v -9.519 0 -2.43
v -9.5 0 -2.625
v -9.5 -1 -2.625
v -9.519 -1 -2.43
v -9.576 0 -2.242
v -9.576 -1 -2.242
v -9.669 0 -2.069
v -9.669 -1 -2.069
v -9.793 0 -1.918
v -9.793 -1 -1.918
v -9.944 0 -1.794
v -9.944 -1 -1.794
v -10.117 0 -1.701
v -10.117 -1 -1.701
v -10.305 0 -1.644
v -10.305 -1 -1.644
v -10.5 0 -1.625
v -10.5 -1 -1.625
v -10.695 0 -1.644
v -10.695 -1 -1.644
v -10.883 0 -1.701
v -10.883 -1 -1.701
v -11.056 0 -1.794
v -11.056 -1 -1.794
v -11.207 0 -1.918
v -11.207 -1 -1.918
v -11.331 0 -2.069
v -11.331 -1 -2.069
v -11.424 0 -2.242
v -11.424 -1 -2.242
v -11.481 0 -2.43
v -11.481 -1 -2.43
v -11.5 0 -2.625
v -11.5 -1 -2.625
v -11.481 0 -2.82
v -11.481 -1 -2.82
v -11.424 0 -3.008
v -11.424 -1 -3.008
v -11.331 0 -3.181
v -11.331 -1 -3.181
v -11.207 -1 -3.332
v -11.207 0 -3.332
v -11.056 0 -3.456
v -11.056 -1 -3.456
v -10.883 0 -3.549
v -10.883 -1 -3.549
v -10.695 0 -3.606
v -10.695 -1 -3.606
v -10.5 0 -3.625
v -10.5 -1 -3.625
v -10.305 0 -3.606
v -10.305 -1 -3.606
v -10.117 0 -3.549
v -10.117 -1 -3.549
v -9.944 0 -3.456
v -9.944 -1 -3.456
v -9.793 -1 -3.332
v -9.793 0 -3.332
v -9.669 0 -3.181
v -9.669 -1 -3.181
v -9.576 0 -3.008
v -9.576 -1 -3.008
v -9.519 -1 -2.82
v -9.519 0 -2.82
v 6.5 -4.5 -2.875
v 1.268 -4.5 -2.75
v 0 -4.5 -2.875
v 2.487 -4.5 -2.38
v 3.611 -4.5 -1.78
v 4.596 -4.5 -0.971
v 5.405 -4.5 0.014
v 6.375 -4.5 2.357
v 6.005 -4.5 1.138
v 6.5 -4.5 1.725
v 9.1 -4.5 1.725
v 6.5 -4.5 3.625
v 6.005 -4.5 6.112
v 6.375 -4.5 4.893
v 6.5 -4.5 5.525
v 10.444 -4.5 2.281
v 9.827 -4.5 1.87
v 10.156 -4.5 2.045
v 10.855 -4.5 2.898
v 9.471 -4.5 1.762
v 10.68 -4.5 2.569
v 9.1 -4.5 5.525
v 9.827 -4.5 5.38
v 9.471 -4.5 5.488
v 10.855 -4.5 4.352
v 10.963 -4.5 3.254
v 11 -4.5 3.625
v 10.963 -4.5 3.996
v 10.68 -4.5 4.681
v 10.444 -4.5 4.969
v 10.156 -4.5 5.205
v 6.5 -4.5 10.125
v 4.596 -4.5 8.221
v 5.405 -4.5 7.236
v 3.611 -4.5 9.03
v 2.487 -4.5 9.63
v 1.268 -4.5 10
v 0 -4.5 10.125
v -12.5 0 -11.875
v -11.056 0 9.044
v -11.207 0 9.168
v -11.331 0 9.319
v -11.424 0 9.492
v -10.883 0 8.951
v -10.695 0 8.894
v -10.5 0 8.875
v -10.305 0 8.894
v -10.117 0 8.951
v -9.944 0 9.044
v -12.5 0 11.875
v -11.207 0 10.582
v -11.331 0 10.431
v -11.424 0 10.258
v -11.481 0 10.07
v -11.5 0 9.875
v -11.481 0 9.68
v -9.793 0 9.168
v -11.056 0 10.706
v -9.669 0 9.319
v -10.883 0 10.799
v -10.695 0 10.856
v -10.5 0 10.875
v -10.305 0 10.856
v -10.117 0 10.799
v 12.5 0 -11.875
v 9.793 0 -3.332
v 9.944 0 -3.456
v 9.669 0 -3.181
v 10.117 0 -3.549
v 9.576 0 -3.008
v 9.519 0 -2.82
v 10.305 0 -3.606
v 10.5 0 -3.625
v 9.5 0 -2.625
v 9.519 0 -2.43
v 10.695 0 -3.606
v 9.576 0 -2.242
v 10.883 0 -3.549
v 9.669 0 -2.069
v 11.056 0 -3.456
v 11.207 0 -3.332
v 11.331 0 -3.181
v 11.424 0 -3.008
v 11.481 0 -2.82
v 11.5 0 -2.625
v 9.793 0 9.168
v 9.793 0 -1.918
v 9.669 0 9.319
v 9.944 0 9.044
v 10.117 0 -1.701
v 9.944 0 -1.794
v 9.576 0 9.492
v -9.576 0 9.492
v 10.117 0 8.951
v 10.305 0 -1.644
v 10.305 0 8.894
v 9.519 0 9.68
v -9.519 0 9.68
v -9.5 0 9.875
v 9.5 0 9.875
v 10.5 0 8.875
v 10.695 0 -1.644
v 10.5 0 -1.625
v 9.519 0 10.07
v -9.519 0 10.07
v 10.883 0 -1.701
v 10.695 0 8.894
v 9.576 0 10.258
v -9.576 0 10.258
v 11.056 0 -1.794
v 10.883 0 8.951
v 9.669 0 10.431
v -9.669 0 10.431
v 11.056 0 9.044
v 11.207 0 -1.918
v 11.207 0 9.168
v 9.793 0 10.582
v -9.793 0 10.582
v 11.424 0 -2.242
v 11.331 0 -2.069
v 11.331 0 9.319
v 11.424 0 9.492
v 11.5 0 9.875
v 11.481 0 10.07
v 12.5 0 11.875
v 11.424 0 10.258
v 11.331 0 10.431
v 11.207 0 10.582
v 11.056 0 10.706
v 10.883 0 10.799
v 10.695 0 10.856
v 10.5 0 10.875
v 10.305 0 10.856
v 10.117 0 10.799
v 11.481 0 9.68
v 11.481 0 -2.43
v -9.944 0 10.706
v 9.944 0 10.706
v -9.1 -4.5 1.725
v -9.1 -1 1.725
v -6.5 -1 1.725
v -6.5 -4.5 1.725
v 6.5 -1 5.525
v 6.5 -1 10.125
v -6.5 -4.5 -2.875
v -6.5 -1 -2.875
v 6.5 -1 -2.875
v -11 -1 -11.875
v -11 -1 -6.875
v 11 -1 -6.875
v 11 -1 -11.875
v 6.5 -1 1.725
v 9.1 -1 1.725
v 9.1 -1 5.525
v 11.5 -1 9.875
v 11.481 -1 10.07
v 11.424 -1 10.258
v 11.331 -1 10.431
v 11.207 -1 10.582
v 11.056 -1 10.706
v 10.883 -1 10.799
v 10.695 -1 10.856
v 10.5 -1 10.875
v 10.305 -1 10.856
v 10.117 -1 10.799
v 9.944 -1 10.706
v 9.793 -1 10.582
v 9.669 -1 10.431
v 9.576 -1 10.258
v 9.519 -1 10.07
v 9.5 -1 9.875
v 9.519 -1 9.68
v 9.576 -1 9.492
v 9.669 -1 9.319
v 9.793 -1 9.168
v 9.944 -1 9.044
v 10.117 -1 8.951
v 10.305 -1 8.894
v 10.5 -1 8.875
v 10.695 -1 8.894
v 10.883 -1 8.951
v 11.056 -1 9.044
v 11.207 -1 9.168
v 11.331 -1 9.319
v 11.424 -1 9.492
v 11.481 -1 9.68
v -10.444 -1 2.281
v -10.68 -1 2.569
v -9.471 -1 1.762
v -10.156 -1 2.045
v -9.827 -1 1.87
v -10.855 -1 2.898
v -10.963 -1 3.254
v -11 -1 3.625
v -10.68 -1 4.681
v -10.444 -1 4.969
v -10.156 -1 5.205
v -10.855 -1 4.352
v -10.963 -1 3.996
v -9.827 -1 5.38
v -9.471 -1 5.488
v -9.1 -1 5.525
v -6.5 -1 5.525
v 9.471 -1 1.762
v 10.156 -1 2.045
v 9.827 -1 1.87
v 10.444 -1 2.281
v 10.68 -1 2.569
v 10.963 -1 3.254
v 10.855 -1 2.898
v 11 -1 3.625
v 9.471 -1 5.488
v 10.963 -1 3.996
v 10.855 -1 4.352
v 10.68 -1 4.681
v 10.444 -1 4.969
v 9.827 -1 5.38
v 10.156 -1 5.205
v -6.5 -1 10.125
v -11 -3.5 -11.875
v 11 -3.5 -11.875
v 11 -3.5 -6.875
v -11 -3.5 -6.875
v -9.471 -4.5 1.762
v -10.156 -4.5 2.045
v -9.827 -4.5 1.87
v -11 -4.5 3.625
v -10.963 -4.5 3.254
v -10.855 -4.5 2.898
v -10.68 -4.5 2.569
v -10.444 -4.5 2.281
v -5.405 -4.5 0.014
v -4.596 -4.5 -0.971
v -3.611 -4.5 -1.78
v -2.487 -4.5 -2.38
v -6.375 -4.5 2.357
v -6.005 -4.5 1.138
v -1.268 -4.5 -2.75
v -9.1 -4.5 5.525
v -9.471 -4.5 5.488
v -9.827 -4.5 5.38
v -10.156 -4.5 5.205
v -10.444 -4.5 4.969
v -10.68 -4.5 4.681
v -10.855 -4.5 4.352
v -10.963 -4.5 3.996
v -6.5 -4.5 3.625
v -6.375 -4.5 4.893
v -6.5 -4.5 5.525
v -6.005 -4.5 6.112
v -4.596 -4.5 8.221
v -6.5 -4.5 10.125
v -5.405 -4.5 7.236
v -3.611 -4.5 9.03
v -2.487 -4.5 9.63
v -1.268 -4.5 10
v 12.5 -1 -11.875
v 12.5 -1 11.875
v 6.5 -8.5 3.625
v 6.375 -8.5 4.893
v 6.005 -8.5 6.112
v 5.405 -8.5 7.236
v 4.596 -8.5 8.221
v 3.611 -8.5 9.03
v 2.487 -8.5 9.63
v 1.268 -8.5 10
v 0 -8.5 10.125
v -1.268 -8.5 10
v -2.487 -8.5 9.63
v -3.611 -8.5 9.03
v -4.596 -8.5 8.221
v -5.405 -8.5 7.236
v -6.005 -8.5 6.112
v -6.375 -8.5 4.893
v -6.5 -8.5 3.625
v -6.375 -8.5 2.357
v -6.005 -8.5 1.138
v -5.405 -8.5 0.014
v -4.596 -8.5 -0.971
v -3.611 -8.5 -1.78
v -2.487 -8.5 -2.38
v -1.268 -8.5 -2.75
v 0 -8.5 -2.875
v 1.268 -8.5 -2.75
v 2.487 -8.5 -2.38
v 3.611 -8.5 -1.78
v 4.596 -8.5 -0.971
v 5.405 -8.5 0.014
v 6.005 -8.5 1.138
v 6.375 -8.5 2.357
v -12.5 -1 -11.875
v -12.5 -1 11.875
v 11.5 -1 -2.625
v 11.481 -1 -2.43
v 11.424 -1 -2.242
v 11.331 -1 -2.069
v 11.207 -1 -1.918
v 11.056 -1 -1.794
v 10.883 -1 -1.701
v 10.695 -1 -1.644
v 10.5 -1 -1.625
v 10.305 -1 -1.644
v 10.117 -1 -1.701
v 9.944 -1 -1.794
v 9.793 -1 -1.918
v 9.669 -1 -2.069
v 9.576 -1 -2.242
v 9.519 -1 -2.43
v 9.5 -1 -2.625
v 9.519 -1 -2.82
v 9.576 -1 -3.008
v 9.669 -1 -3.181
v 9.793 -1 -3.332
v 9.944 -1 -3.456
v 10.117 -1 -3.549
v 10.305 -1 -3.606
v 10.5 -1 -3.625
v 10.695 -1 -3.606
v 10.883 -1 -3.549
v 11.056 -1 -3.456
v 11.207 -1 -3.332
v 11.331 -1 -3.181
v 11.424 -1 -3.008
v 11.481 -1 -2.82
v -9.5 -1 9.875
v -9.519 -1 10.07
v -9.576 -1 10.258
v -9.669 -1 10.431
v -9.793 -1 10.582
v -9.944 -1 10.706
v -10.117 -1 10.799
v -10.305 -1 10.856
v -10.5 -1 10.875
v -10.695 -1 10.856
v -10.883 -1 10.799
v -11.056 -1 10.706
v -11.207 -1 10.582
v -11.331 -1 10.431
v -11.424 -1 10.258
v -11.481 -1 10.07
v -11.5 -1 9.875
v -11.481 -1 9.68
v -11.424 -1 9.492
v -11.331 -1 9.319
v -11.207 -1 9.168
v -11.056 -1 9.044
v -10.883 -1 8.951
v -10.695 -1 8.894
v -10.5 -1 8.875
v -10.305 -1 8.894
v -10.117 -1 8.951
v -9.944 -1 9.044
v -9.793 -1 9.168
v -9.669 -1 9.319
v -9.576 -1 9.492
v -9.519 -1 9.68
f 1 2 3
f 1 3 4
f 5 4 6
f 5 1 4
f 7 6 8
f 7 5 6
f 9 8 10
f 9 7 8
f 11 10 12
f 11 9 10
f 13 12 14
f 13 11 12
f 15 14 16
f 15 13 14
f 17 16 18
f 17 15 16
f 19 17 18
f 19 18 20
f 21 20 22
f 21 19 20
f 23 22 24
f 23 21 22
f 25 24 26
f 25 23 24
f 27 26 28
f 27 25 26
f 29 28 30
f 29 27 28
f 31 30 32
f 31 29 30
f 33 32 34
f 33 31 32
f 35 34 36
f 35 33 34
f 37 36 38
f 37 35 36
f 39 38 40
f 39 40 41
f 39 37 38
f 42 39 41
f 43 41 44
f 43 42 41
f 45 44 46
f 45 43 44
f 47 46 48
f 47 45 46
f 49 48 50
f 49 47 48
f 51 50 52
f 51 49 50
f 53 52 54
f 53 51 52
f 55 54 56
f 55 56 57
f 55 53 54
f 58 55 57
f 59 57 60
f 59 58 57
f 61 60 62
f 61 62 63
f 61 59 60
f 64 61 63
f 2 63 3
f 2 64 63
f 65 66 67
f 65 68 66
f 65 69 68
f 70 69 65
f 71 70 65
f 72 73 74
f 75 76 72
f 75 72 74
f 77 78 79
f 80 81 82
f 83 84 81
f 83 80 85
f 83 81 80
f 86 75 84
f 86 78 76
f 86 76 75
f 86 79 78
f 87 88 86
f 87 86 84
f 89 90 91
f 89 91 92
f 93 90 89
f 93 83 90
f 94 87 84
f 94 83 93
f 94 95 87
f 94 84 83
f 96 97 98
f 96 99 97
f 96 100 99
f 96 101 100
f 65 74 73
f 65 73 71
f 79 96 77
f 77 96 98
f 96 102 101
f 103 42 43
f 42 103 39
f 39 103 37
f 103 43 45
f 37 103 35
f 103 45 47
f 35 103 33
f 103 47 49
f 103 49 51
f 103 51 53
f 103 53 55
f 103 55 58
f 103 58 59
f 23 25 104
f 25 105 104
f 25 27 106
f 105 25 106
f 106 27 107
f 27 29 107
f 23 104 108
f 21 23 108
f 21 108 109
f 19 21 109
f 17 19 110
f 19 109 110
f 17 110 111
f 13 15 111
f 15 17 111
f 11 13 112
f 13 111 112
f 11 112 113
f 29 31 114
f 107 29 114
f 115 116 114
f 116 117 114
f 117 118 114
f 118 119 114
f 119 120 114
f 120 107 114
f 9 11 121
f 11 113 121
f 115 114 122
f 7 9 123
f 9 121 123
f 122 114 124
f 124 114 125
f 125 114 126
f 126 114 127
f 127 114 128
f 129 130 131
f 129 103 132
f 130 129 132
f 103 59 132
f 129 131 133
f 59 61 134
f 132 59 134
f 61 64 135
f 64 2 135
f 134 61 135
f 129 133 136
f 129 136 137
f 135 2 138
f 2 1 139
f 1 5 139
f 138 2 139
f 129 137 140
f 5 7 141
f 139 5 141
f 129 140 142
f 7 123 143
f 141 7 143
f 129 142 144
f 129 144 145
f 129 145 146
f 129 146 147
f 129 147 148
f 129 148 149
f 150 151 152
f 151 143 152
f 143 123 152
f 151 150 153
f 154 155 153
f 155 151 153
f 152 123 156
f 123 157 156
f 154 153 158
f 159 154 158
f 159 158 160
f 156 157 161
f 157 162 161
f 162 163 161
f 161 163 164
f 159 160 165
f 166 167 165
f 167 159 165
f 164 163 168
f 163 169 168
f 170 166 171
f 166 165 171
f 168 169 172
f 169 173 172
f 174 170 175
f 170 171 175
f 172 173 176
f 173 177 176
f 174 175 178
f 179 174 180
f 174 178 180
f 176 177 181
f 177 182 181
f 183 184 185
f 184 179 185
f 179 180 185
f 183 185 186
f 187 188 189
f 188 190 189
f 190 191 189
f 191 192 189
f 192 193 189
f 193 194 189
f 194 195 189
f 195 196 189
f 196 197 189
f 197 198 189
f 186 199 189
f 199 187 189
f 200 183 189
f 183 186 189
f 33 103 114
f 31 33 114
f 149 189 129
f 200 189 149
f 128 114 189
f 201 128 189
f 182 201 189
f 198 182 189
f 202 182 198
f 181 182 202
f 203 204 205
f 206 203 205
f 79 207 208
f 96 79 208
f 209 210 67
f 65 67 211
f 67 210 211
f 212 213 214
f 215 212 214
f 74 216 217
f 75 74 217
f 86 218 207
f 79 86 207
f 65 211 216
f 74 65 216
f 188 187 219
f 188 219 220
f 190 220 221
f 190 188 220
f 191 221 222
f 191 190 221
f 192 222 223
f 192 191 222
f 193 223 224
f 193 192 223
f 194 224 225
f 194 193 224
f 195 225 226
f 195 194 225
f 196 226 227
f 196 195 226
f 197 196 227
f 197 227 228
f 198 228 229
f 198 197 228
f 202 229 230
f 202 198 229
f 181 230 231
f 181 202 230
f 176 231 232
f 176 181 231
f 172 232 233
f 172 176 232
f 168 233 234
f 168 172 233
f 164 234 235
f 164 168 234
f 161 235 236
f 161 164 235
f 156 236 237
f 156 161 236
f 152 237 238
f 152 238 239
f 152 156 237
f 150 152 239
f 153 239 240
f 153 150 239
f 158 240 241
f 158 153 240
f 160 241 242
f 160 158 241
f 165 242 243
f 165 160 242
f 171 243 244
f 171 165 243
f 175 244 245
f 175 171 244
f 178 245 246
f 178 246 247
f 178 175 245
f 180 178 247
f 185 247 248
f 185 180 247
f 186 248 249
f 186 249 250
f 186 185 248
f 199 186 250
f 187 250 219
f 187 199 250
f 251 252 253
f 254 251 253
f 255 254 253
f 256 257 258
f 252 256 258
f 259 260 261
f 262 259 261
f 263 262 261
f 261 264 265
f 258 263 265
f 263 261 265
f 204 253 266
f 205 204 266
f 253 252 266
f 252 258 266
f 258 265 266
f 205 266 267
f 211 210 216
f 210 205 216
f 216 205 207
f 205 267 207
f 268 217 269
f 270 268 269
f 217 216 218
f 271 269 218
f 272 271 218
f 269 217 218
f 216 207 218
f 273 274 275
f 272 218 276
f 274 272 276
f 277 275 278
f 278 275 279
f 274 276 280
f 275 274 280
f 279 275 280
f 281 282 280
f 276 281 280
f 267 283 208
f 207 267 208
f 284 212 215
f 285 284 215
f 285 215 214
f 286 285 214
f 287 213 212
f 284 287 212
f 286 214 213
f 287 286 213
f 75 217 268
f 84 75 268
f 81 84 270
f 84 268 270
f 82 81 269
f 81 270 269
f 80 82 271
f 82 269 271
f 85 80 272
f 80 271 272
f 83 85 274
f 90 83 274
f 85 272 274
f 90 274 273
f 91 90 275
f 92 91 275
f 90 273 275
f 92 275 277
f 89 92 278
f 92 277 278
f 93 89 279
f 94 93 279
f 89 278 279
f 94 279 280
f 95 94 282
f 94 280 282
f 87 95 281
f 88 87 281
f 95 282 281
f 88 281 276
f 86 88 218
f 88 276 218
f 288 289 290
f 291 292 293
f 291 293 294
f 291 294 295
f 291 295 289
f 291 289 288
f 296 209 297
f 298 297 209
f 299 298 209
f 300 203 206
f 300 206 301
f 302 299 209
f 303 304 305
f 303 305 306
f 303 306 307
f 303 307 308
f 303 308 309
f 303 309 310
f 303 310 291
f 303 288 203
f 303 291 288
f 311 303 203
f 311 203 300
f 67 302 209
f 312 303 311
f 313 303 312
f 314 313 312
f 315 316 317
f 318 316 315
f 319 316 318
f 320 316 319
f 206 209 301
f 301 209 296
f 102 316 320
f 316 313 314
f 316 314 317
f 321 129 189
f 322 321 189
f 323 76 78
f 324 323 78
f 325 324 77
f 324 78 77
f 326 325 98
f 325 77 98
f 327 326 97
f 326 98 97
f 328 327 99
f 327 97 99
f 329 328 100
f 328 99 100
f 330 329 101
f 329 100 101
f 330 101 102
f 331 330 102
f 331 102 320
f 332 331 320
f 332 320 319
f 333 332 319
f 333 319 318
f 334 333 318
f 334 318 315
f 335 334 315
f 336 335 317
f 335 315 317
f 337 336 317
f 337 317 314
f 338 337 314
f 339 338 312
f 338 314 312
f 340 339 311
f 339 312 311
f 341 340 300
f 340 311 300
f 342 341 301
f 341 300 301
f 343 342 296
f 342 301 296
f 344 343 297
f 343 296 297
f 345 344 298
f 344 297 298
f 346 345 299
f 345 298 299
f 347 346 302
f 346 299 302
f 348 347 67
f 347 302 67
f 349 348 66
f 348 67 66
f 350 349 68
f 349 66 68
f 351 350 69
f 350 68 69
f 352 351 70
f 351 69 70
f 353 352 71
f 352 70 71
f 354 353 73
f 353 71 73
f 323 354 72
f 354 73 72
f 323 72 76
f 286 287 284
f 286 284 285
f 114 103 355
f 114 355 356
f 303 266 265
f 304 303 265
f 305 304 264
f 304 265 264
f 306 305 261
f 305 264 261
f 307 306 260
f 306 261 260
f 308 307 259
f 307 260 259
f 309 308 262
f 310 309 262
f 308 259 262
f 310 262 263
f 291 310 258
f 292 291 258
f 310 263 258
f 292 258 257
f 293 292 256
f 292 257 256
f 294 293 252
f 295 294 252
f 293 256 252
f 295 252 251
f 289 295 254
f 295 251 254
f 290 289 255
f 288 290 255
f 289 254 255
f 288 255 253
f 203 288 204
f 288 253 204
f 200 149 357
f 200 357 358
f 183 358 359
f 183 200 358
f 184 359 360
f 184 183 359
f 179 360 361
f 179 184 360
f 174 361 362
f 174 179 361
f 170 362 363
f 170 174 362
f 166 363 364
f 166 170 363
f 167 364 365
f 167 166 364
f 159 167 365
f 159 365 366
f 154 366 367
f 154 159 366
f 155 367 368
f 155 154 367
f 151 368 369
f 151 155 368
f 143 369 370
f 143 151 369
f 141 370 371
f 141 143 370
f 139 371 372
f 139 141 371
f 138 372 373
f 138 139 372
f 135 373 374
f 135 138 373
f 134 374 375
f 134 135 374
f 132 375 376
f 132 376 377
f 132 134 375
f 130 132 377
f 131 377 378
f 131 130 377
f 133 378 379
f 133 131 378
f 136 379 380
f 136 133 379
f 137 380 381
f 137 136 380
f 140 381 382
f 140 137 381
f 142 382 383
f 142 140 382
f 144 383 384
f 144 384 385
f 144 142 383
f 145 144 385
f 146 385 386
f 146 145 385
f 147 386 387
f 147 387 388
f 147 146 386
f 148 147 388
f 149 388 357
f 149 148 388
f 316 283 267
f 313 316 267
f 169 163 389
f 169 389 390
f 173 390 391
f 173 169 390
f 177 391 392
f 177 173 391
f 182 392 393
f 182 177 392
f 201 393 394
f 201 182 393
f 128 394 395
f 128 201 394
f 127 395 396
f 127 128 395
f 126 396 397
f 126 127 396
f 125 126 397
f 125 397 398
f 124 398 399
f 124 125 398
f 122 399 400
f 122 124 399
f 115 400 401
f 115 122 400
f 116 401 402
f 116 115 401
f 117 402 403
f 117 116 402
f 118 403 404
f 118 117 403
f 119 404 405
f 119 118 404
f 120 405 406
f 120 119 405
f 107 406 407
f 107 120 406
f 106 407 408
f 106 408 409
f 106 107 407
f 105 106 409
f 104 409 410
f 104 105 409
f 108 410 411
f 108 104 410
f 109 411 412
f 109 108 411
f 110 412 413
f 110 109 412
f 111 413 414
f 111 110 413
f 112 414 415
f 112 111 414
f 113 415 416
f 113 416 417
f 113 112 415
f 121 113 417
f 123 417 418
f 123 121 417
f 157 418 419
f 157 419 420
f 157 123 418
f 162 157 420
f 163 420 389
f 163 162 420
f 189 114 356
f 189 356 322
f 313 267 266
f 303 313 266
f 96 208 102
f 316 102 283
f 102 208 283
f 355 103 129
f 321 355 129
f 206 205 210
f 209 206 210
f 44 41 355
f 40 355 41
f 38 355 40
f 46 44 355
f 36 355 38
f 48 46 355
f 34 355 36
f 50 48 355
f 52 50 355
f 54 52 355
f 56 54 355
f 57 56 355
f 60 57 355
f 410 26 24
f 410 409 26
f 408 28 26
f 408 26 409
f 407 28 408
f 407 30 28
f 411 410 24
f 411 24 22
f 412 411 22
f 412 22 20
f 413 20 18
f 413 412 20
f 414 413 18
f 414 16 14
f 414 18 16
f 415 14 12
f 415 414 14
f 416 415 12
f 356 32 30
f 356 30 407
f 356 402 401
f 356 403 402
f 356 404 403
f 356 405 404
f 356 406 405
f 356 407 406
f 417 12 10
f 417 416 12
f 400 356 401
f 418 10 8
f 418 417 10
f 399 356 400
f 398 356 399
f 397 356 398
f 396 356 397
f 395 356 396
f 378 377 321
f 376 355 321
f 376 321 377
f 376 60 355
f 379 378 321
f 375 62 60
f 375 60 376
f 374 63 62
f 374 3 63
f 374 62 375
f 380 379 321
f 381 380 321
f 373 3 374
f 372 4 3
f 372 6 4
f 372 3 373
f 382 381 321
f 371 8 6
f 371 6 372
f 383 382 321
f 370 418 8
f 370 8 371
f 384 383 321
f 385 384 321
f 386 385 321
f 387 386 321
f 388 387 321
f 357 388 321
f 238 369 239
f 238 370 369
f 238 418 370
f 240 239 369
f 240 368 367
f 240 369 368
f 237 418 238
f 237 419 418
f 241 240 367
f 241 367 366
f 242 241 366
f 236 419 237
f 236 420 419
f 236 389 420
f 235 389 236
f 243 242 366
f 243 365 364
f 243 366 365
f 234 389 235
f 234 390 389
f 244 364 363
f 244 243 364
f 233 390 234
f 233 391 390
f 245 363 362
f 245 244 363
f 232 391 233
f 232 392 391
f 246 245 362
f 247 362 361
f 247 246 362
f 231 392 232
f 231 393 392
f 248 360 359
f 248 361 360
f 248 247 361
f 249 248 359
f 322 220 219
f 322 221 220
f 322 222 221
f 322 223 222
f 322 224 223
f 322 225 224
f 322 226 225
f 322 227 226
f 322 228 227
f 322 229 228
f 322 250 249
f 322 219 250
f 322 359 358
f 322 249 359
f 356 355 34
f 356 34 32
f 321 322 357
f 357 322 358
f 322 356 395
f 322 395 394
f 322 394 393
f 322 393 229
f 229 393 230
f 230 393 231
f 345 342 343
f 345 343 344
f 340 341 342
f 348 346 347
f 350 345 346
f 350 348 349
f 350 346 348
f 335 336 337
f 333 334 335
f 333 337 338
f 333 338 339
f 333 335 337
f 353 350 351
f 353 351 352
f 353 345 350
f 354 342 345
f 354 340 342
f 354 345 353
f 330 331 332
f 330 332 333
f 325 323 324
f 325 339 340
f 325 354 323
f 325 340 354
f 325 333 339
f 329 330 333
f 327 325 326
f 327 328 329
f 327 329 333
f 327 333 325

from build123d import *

# Parameters (mm, degrees)
F0_W     = 25
F0_H     = 23.75
F0_R     = 1
F1_DEPTH = 1
F3_DEPTH = 2.5
F5_DEPTH = 3.5
F6_R     = 6.5
F7_DEPTH = 4


with BuildPart() as f1:
    # F0 (on Front) → F1 (new body)
    with BuildSketch(Plane.XZ):
        Rectangle(F0_W, F0_H)
        with Locations((-10.5, -2.625)):
            Circle(F0_R, mode=Mode.SUBTRACT)
        with Locations((10.5, -2.625)):
            Circle(F0_R, mode=Mode.SUBTRACT)
        with Locations((-10.5, 9.875)):
            Circle(F0_R, mode=Mode.SUBTRACT)
        with Locations((10.5, 9.875)):
            Circle(F0_R, mode=Mode.SUBTRACT)
    extrude(amount=F1_DEPTH)


with BuildPart() as f3:
    # F2 (on face) → F3 (new body)
    with BuildSketch(Plane.XZ.offset(1)):
        Polygon((-11, -6.875), (-11, -11.875), (0, -11.875), (11, -11.875), (11, -6.875), (0, -6.875), align=None)
    extrude(amount=F3_DEPTH)


with BuildPart() as f5:
    # F4 (on face) → F5 (new body)
    with BuildSketch(Plane.XZ.offset(1)):
        with BuildLine():
            Line((-6.5, -2.875), (6.5, -2.875))
            Line((6.5, -2.875), (6.5, 1.725))
            Line((6.5, 1.725), (9.1, 1.725))
            ThreePointArc((9.1, 1.725), (11, 3.625), (9.1, 5.525))
            Line((9.1, 5.525), (6.5, 5.525))
            Line((6.5, 5.525), (6.5, 10.125))
            Line((6.5, 10.125), (-6.5, 10.125))
            Line((-6.5, 10.125), (-6.5, 5.525))
            Line((-6.5, 5.525), (-9.1, 5.525))
            ThreePointArc((-9.1, 5.525), (-11, 3.625), (-9.1, 1.725))
            Line((-9.1, 1.725), (-6.5, 1.725))
            Line((-6.5, 1.725), (-6.5, -2.875))
        make_face()
    extrude(amount=F5_DEPTH)

    # F6 (on face) → F7 (join)
    with BuildSketch(Plane.XZ.offset(4.5)):
        with Locations((0, 3.625)):
            Circle(F6_R)
    extrude(amount=F7_DEPTH)


solid = Compound([f1.part, f3.part, f5.part])
